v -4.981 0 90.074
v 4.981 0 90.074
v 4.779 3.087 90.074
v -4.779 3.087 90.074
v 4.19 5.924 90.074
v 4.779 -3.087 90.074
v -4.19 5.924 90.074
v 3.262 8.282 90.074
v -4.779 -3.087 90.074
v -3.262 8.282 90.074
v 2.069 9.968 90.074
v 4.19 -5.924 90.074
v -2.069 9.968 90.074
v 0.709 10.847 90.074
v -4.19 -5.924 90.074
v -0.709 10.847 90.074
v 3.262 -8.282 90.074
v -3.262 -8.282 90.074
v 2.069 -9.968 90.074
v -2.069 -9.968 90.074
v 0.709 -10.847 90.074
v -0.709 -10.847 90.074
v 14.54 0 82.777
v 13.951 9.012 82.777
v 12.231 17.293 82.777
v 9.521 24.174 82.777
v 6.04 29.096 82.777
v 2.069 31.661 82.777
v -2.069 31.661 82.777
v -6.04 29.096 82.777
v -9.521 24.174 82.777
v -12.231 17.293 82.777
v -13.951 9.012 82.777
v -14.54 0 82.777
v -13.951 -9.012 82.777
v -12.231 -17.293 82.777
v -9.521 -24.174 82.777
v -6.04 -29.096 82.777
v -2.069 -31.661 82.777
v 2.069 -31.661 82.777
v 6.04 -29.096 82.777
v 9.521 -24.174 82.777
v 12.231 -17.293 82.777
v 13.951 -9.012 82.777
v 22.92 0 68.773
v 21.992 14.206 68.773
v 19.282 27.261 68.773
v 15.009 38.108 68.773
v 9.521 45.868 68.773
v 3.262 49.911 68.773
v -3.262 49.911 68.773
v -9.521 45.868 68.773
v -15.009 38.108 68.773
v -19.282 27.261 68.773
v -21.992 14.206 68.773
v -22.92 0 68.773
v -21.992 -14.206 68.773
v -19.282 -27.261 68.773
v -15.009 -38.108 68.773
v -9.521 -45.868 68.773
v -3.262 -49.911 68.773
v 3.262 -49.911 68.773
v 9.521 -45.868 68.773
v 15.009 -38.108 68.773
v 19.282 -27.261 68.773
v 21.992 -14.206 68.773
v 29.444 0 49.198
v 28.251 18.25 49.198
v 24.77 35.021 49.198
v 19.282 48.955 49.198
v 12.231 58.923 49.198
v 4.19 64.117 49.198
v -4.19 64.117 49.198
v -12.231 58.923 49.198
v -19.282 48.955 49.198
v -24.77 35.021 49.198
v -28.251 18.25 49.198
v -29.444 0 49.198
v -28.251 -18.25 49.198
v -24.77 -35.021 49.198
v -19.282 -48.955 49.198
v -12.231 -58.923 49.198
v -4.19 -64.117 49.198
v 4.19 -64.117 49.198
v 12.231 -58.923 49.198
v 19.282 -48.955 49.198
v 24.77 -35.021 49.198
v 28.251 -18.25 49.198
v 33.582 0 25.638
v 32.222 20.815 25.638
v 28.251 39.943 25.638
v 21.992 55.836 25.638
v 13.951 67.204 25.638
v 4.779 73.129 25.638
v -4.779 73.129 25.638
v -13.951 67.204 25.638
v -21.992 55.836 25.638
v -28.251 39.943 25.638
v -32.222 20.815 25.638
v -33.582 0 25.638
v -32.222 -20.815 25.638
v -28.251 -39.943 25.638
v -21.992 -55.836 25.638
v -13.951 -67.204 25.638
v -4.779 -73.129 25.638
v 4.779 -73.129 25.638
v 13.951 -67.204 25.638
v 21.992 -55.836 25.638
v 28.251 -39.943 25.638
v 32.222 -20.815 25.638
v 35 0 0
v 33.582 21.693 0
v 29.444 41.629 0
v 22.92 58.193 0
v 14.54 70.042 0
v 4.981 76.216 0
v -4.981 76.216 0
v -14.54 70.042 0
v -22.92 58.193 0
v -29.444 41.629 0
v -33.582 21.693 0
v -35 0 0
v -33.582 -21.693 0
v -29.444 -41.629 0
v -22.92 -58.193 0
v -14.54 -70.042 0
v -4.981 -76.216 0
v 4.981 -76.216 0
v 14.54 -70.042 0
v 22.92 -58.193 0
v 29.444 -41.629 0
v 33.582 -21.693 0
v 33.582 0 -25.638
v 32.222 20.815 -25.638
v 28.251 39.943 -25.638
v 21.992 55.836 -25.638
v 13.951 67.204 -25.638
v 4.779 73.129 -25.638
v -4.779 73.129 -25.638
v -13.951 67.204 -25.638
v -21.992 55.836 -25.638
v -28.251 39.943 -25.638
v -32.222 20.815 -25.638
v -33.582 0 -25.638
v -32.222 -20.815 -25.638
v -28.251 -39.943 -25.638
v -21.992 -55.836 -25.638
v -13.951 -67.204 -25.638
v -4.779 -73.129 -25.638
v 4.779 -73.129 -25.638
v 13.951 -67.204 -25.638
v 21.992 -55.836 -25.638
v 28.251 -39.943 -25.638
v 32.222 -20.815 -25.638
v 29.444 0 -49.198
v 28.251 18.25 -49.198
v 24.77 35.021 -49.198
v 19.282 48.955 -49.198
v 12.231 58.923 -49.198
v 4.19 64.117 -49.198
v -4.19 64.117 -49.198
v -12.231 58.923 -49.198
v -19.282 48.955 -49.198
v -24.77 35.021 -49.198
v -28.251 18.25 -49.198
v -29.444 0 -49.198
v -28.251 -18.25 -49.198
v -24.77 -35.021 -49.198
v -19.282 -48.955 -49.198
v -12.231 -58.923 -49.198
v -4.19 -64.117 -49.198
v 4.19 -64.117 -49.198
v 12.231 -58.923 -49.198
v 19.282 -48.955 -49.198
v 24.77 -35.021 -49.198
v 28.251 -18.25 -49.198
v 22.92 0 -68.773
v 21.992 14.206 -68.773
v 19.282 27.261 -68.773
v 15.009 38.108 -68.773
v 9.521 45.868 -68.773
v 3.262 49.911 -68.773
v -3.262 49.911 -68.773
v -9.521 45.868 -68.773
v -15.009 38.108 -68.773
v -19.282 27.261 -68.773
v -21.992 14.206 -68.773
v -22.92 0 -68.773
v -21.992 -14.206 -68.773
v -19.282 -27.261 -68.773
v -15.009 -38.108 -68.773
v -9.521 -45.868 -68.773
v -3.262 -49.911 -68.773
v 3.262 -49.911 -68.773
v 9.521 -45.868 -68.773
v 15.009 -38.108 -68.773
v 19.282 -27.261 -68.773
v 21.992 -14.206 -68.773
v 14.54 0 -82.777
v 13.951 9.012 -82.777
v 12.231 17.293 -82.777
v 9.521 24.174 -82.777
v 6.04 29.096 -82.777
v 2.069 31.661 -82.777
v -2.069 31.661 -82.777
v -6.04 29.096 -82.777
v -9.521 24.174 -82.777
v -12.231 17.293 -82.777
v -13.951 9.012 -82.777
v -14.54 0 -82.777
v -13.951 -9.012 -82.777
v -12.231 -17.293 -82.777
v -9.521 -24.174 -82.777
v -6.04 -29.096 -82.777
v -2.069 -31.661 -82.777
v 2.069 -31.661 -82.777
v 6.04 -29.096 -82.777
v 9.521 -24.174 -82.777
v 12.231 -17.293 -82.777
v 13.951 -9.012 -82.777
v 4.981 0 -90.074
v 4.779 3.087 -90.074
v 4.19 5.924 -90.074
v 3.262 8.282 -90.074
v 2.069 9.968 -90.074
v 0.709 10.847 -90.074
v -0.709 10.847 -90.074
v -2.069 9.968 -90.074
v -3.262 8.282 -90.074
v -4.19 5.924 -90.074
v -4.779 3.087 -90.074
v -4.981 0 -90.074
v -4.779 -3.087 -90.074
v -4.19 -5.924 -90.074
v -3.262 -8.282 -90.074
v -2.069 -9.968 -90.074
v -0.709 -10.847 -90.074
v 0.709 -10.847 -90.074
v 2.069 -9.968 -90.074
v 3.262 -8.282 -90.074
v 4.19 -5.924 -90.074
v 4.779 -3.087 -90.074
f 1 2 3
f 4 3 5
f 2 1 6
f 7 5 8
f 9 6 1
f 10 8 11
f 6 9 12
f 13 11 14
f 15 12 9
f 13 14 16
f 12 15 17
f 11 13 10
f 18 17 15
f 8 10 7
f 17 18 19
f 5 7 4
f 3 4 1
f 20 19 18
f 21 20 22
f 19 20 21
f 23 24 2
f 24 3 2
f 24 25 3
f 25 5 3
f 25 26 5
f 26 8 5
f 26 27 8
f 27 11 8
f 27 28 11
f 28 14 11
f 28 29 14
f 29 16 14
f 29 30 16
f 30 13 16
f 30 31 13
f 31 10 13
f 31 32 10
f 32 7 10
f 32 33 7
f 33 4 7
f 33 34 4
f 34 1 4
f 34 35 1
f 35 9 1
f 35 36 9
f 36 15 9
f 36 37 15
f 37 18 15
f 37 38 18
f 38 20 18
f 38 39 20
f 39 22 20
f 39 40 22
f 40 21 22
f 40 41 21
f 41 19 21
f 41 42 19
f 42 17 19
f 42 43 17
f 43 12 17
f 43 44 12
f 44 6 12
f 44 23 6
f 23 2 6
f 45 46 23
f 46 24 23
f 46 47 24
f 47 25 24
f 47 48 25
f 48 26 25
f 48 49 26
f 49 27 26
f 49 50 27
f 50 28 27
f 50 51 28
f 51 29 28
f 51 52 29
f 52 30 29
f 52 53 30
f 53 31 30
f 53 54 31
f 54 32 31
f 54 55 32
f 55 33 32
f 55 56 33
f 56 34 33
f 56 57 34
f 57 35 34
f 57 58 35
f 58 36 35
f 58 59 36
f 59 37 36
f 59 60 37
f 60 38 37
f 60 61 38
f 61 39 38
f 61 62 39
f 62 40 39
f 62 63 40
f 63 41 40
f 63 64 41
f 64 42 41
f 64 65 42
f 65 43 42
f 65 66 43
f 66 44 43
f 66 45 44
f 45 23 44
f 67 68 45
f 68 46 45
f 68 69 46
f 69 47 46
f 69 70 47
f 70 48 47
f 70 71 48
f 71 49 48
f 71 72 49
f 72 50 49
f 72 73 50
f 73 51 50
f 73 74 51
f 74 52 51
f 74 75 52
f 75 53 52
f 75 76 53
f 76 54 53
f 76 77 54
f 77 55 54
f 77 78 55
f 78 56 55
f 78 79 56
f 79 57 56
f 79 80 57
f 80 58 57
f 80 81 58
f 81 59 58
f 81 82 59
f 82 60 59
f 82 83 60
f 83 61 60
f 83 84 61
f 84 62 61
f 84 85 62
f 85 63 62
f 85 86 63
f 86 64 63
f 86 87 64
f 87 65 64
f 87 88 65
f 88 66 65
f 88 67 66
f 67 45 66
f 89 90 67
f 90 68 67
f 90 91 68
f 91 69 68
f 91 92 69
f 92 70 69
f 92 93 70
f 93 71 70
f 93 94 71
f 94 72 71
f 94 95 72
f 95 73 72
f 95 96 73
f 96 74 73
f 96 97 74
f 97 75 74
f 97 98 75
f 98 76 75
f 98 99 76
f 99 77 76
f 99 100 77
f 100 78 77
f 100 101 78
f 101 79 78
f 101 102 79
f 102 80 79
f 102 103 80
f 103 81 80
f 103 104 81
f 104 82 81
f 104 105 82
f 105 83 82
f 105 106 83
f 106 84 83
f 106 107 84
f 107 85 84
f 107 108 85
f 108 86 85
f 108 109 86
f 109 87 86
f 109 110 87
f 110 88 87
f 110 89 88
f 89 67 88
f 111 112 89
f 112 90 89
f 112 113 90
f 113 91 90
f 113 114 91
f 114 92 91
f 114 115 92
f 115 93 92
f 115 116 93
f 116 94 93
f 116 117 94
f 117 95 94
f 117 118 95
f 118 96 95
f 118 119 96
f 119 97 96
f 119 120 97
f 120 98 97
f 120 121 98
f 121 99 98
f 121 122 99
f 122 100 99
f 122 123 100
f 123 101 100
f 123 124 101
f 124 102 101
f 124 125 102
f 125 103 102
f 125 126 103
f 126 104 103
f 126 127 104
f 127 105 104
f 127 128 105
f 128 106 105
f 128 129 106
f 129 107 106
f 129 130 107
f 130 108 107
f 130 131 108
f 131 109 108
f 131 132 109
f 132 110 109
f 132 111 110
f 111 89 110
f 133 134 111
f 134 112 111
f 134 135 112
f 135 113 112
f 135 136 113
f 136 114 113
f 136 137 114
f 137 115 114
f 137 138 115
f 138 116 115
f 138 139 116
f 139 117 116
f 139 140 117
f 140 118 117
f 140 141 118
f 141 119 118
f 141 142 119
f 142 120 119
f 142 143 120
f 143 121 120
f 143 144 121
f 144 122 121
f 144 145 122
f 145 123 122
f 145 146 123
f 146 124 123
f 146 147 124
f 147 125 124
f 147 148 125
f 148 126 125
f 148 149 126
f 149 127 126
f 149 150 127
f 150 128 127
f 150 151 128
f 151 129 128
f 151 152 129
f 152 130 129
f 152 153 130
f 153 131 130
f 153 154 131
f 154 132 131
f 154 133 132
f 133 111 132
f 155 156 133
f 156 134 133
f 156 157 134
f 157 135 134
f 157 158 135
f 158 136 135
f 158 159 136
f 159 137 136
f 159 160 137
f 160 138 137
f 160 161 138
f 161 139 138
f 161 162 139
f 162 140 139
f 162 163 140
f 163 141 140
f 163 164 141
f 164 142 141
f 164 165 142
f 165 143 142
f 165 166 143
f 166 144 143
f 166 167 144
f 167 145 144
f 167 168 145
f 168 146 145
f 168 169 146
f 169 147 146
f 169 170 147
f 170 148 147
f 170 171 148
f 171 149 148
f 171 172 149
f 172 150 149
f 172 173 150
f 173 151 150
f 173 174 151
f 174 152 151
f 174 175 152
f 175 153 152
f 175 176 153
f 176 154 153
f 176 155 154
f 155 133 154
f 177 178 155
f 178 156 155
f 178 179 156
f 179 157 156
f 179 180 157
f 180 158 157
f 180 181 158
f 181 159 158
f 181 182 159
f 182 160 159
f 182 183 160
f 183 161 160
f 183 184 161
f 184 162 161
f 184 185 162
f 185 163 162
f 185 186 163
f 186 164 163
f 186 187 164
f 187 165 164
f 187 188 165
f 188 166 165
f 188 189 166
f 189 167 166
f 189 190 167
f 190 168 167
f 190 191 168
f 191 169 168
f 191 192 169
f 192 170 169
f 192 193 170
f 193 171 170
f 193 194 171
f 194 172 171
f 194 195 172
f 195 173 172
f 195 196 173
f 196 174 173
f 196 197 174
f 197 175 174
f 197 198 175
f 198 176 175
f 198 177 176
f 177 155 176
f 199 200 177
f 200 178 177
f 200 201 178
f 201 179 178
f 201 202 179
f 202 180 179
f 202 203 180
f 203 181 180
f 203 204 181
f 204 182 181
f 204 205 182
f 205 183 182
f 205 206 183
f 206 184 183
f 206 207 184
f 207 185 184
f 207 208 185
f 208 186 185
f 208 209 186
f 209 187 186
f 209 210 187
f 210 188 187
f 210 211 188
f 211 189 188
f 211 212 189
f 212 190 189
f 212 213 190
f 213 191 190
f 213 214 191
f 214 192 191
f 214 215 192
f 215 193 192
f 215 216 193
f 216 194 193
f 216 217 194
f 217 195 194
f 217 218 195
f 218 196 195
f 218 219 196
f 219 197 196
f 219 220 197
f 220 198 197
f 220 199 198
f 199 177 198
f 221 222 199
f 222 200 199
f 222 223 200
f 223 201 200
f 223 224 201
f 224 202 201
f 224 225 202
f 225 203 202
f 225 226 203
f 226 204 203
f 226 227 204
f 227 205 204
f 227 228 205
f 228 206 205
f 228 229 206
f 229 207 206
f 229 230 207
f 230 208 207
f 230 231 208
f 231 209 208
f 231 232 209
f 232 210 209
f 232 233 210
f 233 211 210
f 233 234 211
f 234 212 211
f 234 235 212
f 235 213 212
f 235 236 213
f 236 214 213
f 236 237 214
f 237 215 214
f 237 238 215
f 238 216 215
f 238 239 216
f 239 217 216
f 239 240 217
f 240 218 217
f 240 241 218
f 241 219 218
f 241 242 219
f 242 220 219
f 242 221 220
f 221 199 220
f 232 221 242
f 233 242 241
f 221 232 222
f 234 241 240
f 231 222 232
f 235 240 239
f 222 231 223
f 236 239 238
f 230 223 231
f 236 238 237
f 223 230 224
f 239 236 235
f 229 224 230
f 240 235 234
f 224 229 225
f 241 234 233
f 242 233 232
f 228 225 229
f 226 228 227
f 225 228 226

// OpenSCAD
// Generated by SolidPython 1.0.1 on 2020-07-29 00:46:46


scale(v = [5, 11, 13]) {
	sphere(r = 7);
}
/***********************************************
*********      SolidPython code:      **********
************************************************
 
# import packages: SolidPython
from solid import *
from solid.utils import *
from itertools import chain, combinations, permutations


class Resize:

    def __init__(self, scad_file):
        self.scad_file = scad_file
        #self.scad_file = import_scad(scad_file)
        # cone/cylinder param:
        self.r1 = 0
        self.r2 = 0
        self.h = 0
        # rectangular prism param:
        self.w = 0
        self.l = 0
        # ellipse param:
        self.r = 0

    # import OpenScad code (file name corresponds to shape)


    # classify shape + parameters
    def assign(self, param1, param2, param3):
        if self.scad_file == 'cone.scad':
            self.r1 = param1
            self.r2 = param2
            self.h = param3
        elif self.scad_file == 'cylinder.scad':
            self.r1 = param1
            self.r2 = param2
            self.h = param3
        elif self.scad_file == 'rectangularPrism.scad':
            self.h = param1
            self.l = param2
            self.w = param3
        else:
            self.r = param1
            self.h = param2

    # resize parameters
    def iterate(self):
        x = range(3, 20, 2)
        i = 1
        if self.scad_file == 'cone.scad':
            tempList = list(permutations(x, 2))
            for temp in tempList:
                param1 = temp[0]
                param2 = temp[1]
                filepath = 'produced_scad_files/' + 'cone' + str(param1) + '_' + str(param2) + '_' + '.scad'
                scad_render_to_file(cylinder(h=param1, r1=param2, r2=0), filepath)

        elif self.scad_file == 'cylinder.scad':
            tempList = list(permutations(x, 3))
            for temp in tempList:
                param1 = temp[0]
                param2 = temp[1]
                filepath = 'produced_scad_files/' + 'cylinder' + str(param1) + '_' + str(param2) + '_' + '.scad'
                scad_render_to_file(cylinder(h=param1, r1=param2, r2=param2), filepath)

        elif self.scad_file == 'rectangularPrism.scad':
            tempList = list(permutations(x, 3))
            for temp in tempList:
                param1 = temp[0]
                param2 = temp[1]
                param3 = temp[2]
                filepath = 'produced_scad_files/' + 'rectangularPrism' + str(param1) + '_' + str(param2) + '_' + str(
                    param3) + '.scad'
                scad_render_to_file(cube(size=(param1, param2, param3)), filepath)

        elif self.scad_file == 'ellipse.scad':
            tempList = list(permutations(x, 4))
            for temp in tempList:
                param1 = temp[0]
                param2 = temp[1]
                param3 = temp[2]
                param4 = temp[3]
                filepath = 'produced_scad_files/' + 'ellipse' + str(param1) + '_' + str(param2) + '_' + str(param3) + '_' + str(param4) + '.scad'
                scad_render_to_file(scale([param1, param2, param3])(sphere(r=param4)), filepath)

    def render_to_scadfile(self):
        scad_render_to_file(scad, 'example.scad') 
 
************************************************/
